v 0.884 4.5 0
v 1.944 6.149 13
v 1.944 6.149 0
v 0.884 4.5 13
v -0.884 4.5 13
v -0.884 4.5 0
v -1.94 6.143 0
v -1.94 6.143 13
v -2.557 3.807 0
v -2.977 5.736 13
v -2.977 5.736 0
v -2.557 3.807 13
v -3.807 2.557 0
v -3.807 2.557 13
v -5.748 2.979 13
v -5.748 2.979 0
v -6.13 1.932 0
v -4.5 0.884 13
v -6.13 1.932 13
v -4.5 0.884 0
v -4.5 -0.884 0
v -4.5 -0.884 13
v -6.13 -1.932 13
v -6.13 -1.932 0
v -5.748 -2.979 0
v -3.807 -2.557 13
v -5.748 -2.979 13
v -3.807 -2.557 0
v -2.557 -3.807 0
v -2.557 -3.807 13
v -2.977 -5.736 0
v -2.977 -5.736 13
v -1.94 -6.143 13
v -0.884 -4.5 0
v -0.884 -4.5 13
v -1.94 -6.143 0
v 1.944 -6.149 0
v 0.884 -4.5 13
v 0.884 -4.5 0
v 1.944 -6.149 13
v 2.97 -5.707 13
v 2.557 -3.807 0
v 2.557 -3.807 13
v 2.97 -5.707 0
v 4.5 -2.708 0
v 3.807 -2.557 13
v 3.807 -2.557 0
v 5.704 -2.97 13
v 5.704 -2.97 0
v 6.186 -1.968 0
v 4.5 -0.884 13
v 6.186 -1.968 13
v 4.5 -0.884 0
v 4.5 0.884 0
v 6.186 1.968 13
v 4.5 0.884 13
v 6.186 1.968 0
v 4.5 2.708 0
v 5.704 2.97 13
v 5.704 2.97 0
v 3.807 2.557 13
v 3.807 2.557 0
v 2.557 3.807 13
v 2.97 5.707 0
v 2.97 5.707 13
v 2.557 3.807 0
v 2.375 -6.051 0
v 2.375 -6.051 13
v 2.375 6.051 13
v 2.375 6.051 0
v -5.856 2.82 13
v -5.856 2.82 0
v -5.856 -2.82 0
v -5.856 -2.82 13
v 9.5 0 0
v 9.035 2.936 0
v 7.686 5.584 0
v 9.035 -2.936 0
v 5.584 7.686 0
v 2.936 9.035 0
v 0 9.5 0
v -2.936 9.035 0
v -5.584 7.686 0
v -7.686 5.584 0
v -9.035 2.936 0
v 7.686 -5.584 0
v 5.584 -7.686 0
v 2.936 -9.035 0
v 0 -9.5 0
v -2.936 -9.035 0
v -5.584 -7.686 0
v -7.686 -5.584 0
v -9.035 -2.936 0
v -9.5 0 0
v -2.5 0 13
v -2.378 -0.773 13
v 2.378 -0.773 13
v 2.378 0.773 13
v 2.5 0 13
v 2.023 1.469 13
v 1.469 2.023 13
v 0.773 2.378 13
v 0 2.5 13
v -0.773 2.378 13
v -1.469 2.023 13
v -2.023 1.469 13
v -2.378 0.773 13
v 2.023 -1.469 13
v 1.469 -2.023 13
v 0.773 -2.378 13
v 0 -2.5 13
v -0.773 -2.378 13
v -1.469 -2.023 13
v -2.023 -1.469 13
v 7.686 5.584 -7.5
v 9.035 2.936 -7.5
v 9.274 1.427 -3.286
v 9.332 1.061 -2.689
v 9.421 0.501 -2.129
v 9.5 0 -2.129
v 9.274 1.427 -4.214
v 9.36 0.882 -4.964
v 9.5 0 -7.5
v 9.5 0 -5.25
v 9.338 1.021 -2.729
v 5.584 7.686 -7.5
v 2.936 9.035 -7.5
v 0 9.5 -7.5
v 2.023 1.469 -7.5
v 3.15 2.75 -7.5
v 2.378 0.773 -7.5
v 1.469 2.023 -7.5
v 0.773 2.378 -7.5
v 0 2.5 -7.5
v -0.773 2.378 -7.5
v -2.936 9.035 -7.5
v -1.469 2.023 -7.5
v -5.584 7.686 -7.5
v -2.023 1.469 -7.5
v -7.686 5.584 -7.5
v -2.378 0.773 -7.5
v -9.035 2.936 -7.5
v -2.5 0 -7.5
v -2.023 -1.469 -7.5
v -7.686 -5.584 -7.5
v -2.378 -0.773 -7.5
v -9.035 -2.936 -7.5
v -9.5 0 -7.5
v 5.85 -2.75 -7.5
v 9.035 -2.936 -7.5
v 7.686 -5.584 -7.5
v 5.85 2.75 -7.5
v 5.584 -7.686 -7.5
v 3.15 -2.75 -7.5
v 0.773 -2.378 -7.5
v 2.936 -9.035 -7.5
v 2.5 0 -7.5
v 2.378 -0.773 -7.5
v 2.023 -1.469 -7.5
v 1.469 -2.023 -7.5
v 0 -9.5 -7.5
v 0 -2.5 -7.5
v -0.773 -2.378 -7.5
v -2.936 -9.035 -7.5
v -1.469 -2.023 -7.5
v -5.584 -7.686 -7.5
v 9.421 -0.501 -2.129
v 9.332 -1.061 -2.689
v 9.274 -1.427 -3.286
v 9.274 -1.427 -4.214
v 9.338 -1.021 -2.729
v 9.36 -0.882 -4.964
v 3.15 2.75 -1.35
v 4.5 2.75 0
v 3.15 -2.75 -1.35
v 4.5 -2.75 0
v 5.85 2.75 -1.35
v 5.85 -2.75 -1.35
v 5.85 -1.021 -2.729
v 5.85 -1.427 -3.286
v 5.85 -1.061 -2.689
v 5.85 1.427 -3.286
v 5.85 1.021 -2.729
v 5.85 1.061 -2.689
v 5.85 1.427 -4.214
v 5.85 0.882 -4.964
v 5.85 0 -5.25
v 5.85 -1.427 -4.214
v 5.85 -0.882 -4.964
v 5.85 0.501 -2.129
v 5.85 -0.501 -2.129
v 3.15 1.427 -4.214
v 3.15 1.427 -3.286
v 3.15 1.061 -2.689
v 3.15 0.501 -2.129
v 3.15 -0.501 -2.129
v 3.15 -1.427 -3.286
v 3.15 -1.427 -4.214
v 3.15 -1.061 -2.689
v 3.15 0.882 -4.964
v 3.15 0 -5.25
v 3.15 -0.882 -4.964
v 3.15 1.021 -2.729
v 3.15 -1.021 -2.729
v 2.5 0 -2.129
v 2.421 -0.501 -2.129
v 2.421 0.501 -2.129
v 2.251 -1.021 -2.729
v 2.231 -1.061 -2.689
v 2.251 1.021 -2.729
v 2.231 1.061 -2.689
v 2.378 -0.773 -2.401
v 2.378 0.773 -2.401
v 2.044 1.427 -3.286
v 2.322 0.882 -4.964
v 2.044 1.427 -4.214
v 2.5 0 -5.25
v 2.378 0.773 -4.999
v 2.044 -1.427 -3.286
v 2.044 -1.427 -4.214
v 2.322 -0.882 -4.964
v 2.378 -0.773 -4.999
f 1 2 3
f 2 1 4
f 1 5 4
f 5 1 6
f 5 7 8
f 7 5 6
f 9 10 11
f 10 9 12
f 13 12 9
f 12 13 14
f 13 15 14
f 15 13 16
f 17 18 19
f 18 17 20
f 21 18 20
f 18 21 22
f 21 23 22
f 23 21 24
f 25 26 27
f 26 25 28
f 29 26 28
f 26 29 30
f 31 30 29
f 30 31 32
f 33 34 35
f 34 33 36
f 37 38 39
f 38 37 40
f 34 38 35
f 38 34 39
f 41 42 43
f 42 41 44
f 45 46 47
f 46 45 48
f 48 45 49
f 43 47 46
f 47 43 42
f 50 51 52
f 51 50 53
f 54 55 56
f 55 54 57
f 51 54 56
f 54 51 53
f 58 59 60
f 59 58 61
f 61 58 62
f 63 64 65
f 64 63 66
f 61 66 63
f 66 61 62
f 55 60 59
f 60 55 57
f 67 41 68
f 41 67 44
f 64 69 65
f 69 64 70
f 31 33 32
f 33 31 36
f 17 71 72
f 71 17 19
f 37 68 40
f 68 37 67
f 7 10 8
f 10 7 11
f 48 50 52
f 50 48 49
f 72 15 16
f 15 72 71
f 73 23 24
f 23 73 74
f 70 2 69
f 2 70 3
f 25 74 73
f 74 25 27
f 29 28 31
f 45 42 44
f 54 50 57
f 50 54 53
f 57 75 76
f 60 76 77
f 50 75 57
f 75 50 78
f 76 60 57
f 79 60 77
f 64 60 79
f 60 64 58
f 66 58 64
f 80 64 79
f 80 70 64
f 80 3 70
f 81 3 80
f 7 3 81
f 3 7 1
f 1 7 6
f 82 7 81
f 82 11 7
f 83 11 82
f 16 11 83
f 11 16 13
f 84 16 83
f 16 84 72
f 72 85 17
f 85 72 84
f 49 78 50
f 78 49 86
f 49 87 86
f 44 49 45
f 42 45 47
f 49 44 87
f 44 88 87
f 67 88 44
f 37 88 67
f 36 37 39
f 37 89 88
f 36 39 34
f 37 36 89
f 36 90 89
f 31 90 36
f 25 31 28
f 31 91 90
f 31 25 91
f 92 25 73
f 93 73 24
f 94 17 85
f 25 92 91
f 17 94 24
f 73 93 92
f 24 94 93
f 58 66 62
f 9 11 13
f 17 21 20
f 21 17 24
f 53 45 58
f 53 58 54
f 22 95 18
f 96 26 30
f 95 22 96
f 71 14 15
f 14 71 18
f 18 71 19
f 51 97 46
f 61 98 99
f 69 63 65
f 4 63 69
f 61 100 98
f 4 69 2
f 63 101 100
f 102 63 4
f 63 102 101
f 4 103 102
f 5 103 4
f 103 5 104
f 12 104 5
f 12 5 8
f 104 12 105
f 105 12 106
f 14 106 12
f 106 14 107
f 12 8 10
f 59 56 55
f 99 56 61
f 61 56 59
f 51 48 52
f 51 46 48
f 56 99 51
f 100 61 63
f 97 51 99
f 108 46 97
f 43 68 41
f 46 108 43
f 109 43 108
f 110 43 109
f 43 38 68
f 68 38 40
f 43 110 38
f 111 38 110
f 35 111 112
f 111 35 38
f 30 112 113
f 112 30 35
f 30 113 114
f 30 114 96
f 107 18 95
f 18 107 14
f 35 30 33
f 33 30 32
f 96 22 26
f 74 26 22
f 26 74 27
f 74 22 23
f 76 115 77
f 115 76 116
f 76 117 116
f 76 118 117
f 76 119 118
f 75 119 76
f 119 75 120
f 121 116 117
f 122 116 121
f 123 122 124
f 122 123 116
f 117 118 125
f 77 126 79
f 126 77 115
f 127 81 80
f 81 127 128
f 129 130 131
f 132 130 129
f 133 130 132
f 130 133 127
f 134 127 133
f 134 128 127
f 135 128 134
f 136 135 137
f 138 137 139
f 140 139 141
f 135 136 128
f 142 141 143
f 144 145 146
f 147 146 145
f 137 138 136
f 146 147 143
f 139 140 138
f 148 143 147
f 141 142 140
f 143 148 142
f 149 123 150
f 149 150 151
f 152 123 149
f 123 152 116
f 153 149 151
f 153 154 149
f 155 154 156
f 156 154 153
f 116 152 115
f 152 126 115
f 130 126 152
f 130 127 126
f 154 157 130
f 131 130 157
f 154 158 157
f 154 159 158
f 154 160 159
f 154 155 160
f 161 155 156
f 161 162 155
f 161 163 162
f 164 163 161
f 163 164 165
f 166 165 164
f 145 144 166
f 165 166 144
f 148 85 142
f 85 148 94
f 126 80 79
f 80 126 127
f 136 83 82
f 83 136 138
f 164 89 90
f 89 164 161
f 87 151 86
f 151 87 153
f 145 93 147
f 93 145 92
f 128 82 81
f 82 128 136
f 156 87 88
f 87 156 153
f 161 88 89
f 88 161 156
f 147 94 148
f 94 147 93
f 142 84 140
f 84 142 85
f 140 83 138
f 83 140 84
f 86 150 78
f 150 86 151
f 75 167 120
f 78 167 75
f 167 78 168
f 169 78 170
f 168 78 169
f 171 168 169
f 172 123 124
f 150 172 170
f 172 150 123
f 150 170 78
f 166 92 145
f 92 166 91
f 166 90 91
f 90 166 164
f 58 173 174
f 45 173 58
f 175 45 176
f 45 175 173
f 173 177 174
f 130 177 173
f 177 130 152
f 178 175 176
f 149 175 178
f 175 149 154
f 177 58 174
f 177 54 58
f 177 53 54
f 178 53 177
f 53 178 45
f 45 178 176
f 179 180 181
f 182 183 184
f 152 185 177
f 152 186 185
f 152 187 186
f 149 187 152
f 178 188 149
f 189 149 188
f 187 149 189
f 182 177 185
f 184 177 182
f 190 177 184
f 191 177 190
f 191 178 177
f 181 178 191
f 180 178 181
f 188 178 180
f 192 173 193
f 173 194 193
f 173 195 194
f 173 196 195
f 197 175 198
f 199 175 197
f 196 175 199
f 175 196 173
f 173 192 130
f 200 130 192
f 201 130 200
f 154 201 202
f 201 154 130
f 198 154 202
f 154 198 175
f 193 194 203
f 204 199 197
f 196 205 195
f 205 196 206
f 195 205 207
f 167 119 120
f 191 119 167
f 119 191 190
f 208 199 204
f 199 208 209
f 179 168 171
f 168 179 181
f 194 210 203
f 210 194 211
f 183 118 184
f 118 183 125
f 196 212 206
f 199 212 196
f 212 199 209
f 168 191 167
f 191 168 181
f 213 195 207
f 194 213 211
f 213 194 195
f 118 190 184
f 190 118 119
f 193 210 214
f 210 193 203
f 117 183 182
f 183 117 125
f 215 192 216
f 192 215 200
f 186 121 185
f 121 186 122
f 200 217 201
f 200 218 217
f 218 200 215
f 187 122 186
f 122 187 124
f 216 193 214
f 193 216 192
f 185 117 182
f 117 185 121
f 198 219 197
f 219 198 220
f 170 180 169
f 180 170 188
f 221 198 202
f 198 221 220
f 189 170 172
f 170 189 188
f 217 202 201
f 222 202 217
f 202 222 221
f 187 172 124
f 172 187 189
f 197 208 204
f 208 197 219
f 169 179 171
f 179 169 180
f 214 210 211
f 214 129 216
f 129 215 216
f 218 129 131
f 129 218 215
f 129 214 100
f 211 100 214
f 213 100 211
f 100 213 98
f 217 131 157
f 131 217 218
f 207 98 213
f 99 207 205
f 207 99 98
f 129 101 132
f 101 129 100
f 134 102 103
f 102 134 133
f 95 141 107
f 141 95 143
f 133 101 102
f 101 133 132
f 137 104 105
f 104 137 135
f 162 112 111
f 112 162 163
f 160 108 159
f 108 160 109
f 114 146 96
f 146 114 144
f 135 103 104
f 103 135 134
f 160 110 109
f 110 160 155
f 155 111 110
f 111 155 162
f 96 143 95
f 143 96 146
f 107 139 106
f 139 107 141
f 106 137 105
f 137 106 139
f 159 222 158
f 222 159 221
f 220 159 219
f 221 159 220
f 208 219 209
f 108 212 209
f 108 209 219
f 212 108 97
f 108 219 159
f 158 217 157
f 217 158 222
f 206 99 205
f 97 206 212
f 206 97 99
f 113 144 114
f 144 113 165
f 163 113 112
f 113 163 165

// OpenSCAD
// file: parameters.scad
// Parameters file for RepRap Huxley (and maybe Mendel)

// Set ONE OF these true.

huxley=false;
mendel=true;



pi=3.14159265;

// The relative location in your file system where the .dxf files are
// DXFs are for quick development.  They should be replaced by parameterised CSG in dure course.

fileroot="DXF-files/";

rodsize = 6;	//threaded/smooth rod diameter in mm
xaxis = 182.5;	//width of base in mm
yaxis = 266.5;	//length of base in mm


screwsize = 3;	//bearing bore/screw diameter in mm
bearingsize = 10;	//outer diameter of bearings in mm
bearingwidth = 4;	//width of bearings in mm


rodpitch = rodsize / 6;
rodnutsize = 0.8 * rodsize;
rodnutdiameter = 1.9 * rodsize;
rodwashersize = 0.2 * rodsize;
rodwasherdiameter = 2 * rodsize;
screwpitch = screwsize / 6;
nutsize = 0.8 * screwsize;
nutdiameter = 1.9 * screwsize;
pentanutradius=1.04*screwsize;
washersize = 0.2 * screwsize;
washerdiameter = 2 * screwsize;
partthick = 2 * rodsize;
vertexrodspace = 2 * rodsize;


c = [0.3, 0.3, 0.3];
rodendoffset = rodnutsize + rodwashersize * 2 + partthick / 2;
vertexoffset = vertexrodspace + rodendoffset;


renderrodthreads = false;
renderscrewthreads = false;
fn = 36;

// The gap between the joining rods at a vertex

vertex_radius=sqrt(rodsize*rodsize + vertexoffset*vertexoffset);
vertex_ang = atan(vertexoffset/rodsize)-30;
vertex_gap = 2*vertex_radius*cos(vertex_ang);

// Nema 14 dimensions - these are absolute

nema14_square=35.3;
nema14_screws=26;
nema14_screw_r=1.5;
nema14_hub=22;
nema14_hub_depth=2;
nema14_length=36;
nema14_shaft=5;
nema14_shaft_length=66;
nema14_shaft_projection=19;

// Nema 11 dimensions - these are absolute

nema11_square=28.5;
nema11_screws=23;
nema11_screw_r=1.25;
nema11_hub=22;
nema11_hub_depth=2;
nema11_length=44.5;
nema11_shaft=5;
nema11_shaft_length=78;
nema11_shaft_projection=18;

// Limit switch parameters

limit_switch_hole_diameter=2.5;
limit_switch_centres=9.5;

// The RepRap slide bearings

bearing_mount_centres=18;
bearing_width=7;
bearing_depth=18;

// X axis parameters - many should be relative

x_bar_gap=30;
motor_center_y = 26;
bar_clamp_x=5;
bar_clamp_y=8;
bar_clamp_x_gap=23;
bearing_y=50;
bearing_x=bar_clamp_x_gap + 10;
hole_land=4;
thickness=5;
bearing_low_z = 8;
bearing_z_gap = 25;
bearing_plate_width = bearing_mount_centres+2*hole_land + 10;
bearing_plate_overlap=0.5;
bearing_plate_support=10;
// main file
include <parameters.scad>;


// inner and outer product.  Why aren't these standard?!!!?

function ip(v1 = [0,0,0], v2 = [0,0,0]) = v1.x*v2.x + v1.y*v2.y + v1.z*v2.z;

function op(v1 = [0,0,0], v2 = [0,0,0]) = [v1.y*v2.z - v1.z*v2.y, v1.z*v2.x - v1.x*v2.z, v1.x*v2.y - v1.y*v2.x];


// Adjustable slide bearings for 6mm diameter rods mounted using M3 cap screws 18 mm apart.

// The profile for these should be CSG from the parameters, but at the moment it's a dxf.

// Adrian Bowyer 18 December 2010

//*****************************************************************************************************************

// Make an extrusion from the appropriate profile

module bearingProfile(b360=true)
{
	if(b360)
		linear_extrude(file = str(fileroot, "bearing360.dxf"), layer = "0", height = bearing_width, 
			center = true, convexity = 10, twist = 0, $fn=40);
	else
		linear_extrude(file = str(fileroot, "bearing180.dxf"), layer = "0", height = bearing_width, 
			center = true, convexity = 10, twist = 0, $fn=40);
}

// The distance between the 3mm screw centres is 18 mm
// Set mounts negative to get the bearing, positive to define the teardrop angle, > 360 to get circular holes
// Set b360 true for a 360 degree bearing, false for a 180 one.

module adjustable_bearing(b360=true, mounts=-1)
{
	translate([-13,-9,0]) // Centre the shaft on the z axis
	{
		if(mounts>=0)
		{
			union()
			{
				translate([4, -10, 0])rotate(90, [0, 1, 0])
					rotate(-90, [1, 0, 0])
						if(mounts > 360)
							cylinder(r=1.5, h=50, centre = true, $fn=10);
						else
							rotate([0,0,mounts])
								teardrop(r=1.5, h=50,  center=false, teardrop_angle=0, truncateMM=0.5);
				translate([22, -10, 0])rotate(90, [0, 1, 0])
					rotate(-90, [1, 0, 0])
						if(mounts > 360)
							cylinder(r=1.5, h=50, centre = true, $fn=10);
						else
							rotate([0,0,mounts])
								teardrop(r=1.5, h=50,   center=false, teardrop_angle=0, truncateMM=0.5);
			}
		}else
		{
			difference()
			{
		  		bearingProfile(b360);
				translate([4, -10, 0])rotate(90, [0, 1, 0])
					rotate(-90, [1, 0, 0])
						teardrop(r=1.5, h=50,  center=false, teardrop_angle=0, truncateMM=0.5);
				translate([22, -10, 0])rotate(90, [0, 1, 0])
					rotate(-90, [1, 0, 0])
						teardrop(r=1.5, h=50,  center=false, teardrop_angle=0, truncateMM=0.5);
			}
		}
	}
}




/*
  This makes an angled strut in space between two points.  It is parallel to one of the
  coordinate planes, which means that one coordinate of the two endpoints must be the same.
*/

module strut_block(da, db, wide, deep, round=1)
{
	union()
	{
		translate([-wide/2,-deep/2,0])
			cube([wide, deep, sqrt(da*da + db*db)]);
		if(round == 1)
		{
			rotate([90,0,0])
					cylinder(r=wide/2, h=deep,center=true,$fn=20);
			translate([0,0,sqrt(da*da + db*db)])
				rotate([90,0,0])
					cylinder(r=wide/2, h=deep,center=true,$fn=20);
		} else if(round == 2)
		{
			rotate([0,90,0])
					cylinder(r=deep/2, h=wide,center=true,$fn=20);
			translate([0,0,sqrt(da*da + db*db)])
				rotate([0,90,0])
					cylinder(r=deep/2, h=wide,center=true,$fn=20);
		}
	}
}

module strut(p1=[0,0,0], p2=[0,0,1], wide = 10, deep = 5, round=1)
{
	if(abs(p1.x - p2.x) < 0.00001)
	{
		translate(p1)
			rotate([atan2(p2.z - p1.z, p2.y - p1.y), 0, 0])
				rotate([-90,0,0])
					rotate([0,0,90])
						strut_block(p2.y - p1.y, p2.z - p1.z, wide, deep, round);
	} else if(abs(p1.y - p2.y) < 0.00001)
	{
		translate(p1)
			rotate([0,atan2( p2.x - p1.x, p2.z - p1.z), 0])
					strut_block(p2.x - p1.x, p2.z - p1.z, wide, deep);
	} else
	{
		translate(p1)
			rotate([0,0,atan2(p2.y - p1.y, p2.x - p1.x)])
				rotate([0,90,0])
					strut_block(p2.x - p1.x, p2.y - p1.y, wide, deep, round);
	}
}


/*
  This gives either a NEMA 14 stepper motor or its mounting holes.

  If body is true, you get the motor.  If it is false you get the screw holes and central
  hole needed to mount the motor.  If counterbore is positive and you are generating the mounting holes
  then the screw holes will get fat to accomodate a cap-screw head counterbore mm away from the face 
  of the motor.  For no counterbores, set counterbore negative.

*/

module nema14(body = true, slots = -1, counterbore = -1)
{
	color([1,0.4,0.4,1])
	union()
	{
		if(body)
		{
			translate([0, 0, nema14_shaft_length/2 - nema14_shaft_projection - nema14_hub_depth])
				cylinder(r = nema14_shaft/2, h = nema14_shaft_length, center = true, $fn=20);
			translate([0, 0, -nema14_hub_depth])
				cylinder(r = nema14_hub/2, h = nema14_hub_depth*2, center = true, $fn=20);
	
			translate([0, 0, nema14_length/2])
				cube([nema14_square,nema14_square,nema14_length], center = true);
		} else
			translate([0, 0, -20])
				cylinder(r = nema14_hub/2 + 1, h = 50, center = true, $fn=20);

		if(!body)
		{
			union()
			{
				for ( x = [-0.5, 0.5] ) 
				for ( y = [-0.5, 0.5] )
				{
					translate([x*nema14_screws, y*nema14_screws, -20])
						if(slots <= 0)
							cylinder(r = nema14_screw_r, h = 50, center = true, $fn=10);
						else
							cube([slots, nema14_screw_r*2, 50], center=true);
					if(counterbore >= 0)
						translate([x*nema14_screws, y*nema14_screws, -25-counterbore])
							if(slots <= 0)
								cylinder(r = 2*nema14_screw_r, h = 50, center = true, $fn=10);
							else
								cube([slots+2*nema14_screw_r, nema14_screw_r*4,  50], center=true);
				}
			}
		}
	}
}

module nema11(body = true, slots = -1, counterbore = -1)
{
	color([1,0.4,0.4,1])
	union()
	{
		if(body)
		{
			translate([0, 0, nema11_shaft_length/2 - nema11_shaft_projection - nema11_hub_depth])
				cylinder(r = nema11_shaft/2, h = nema11_shaft_length, center = true, $fn=20);
			translate([0, 0, -nema11_hub_depth])
				cylinder(r = nema11_hub/2, h = nema11_hub_depth*2, center = true, $fn=20);
	
			translate([0, 0, nema11_length/2])
				cube([nema11_square,nema11_square,nema11_length], center = true);
		} else
			translate([0, 0, -20])
				cylinder(r = nema11_hub/2 + 1, h = 50, center = true, $fn=20);

		if(!body)
		{
			union()
			{
				for ( x = [-0.5, 0.5] ) 
				for ( y = [-0.5, 0.5] )
				{
					translate([x*nema11_screws, y*nema11_screws, -20])
						if(slots <= 0)
							cylinder(r = nema11_screw_r, h = 50, center = true, $fn=10);
						else
							cube([slots, nema11_screw_r*2, 50], center=true);
					if(counterbore >= 0)
						translate([x*nema11_screws, y*nema11_screws, -25-counterbore])
							if(slots <= 0)
								cylinder(r = 2*nema11_screw_r, h = 50, center = true, $fn=10);
							else
								cube([slots+2*nema11_screw_r, nema11_screw_r*4,  50], center=true);
				}
			}
		}
	}
}


// Pentagon nut that matches a hexagon...

module pentanut(height=2*nutsize, center=false)
{
		linear_extrude(height = height, center = center, convexity = 10, twist = 0)
			polygon(points = [ [0, -pentanutradius],
							[-pentanutradius*sqrt(3), 0], 
							[0, pentanutradius], 
							[pentanutradius*sin(60), pentanutradius*cos(60)], 
							[pentanutradius*sin(120), pentanutradius*cos(120)], 
							], paths=[[0,1,2,3,4]]);
}



// Make a RepRap teardrop with its axis along Z
// If truncated is true, chop the apex; if not, come to a point

// I stole this function from Erik...

// If teardrop_angle is negative, this just gives an ordinary cylinder.  If it is zero or positive, the 
// teardrop is rotated through that angle.  Other arguments are as for the standard cylinder function.

module teardrop_internal(r=1.5, h=20, teardrop_angle=-1, truncateMM=0.5)
{
	if(teardrop_angle < 0)
		cylinder(r=r, h=h, center=false, $fn=max(2*r, 10));
	 else
		rotate([0, 0, teardrop_angle])
			union()
			{
				if(truncateMM > 0)
				{
					intersection()
					{
						translate([truncateMM,0,h/2]) 
							scale([1,1,h])
								cube([r*2.8275,r*2,1],center=true);
						scale([1,1,h]) 
								rotate([0,0,3*45])
									cube([r,r,1]);
					}
				} else
				{
					scale([1,1,h])
						rotate([0,0,3*45])
							cube([r,r,1]);
				}
				cylinder(r=r, h = h, center=false, $fn=max(2*r, 10));
		}
}

module teardrop(r=1.5, h=20, center=false, teardrop_angle=-1, truncateMM=0.5)
{
	if(center)
		translate([0, 0, -h/2])
			teardrop_internal(r=r, h=h, teardrop_angle=teardrop_angle, truncateMM=truncateMM);
	else
		teardrop_internal(r=r, h=h, teardrop_angle=teardrop_angle, truncateMM=truncateMM);
}


// Make a ball-bearing holder cutout

module bearing_holder(radius = 6.5)
{
	union()
	{
		cylinder (h = radius*20, r = radius, center = true, $fn = 20);
		for(i=[0:2])
		{
			rotate([0,0,120*i])
				translate([radius+screwsize/2, 0, 0])
					union()
					{
						cylinder (h = radius*20, r = screwsize/2, center = true, $fn = 20);
						translate([-screwsize, 0, 0])
							cube([2*screwsize, screwsize, radius*20], center = true);
					}
		}
	}
}

// Make a cuboid with a 45 degree top for vertical slots etc

module cen_hat(size)
{
	translate([0, 0, size.x/sqrt(2)])
		union()
		{
			rotate([0, 45, 0])
				cube([size.x, size.y, 5*max(size.x, max(size.y, size.z))], center=true);
			rotate([0, -45, 0])
				cube([size.x, size.y, 5*max(size.x, max(size.y, size.z))], center=true);
		}
}

module hat_cube(size = [1,1,1], center = false)
{
	difference()
	{
		cube(size, center);
		if(center)
			translate([0, 0, size.z/2])
				cen_hat(size);
		else
			translate([size.x/2, size.y/2, size.z])
				cen_hat(size);
	}
}



module rod(length, threaded=false) if (threaded && renderrodthreads) {
	linear_extrude(height = length, center = true, convexity = 10, twist = -360 * length / rodpitch, $fn = fn)
		translate([rodsize * 0.1 / 2, 0, 0])
			circle(r = rodsize * 0.9 / 2, $fn = fn);
} else cylinder(h = length, r = rodsize / 2, center = true, $fn = fn);


module rodnut(position, washer) render() translate([0, 0, position]) {
	intersection() {
		scale([1, 1, 0.5]) sphere(r = 1.05 * rodsize, center = true);
		difference() {
			cylinder (h = rodnutsize, r = rodnutdiameter / 2, center = true, $fn = 6);
			rod(rodnutsize + 0.1);
		}
	}
	if (washer == 1 || washer == 4) rodwasher(((position > 0) ? -1 : 1) * (rodnutsize + rodwashersize) / 2);
	if (washer == 2 || washer == 4) rodwasher(((position > 0) ? 1 : -1) * (rodnutsize + rodwashersize) / 2);
}


module rodwasher(position) render() translate ([0, 0, position]) difference() {
	cylinder(r = rodwasherdiameter / 2, h = rodwashersize, center = true, $fn = fn);
	rod(rodwashersize + 0.1);
}


module screw(length, nutpos, washer, bearingpos = -1) union(){
	translate([0, 0, -length / 2]) if (renderscrewthreads) {
		linear_extrude(height = length, center = true, convexity = 10, twist = -360 * length / screwpitch, $fn = fn)
			translate([screwsize * 0.1 / 2, 0, 0])
				circle(r = screwsize * 0.9 / 2, $fn = fn);
	} else cylinder(h = length, r = screwsize / 2, center = true, $fn = fn);
	render() difference() {
		translate([0, 0, screwsize / 2]) cylinder(h = screwsize, r = screwsize, center = true, $fn = fn);
		translate([0, 0, screwsize]) cylinder(h = screwsize, r = screwsize / 2, center = true, $fn = 6);
	}
	if (washer > 0 && nutpos > 0) {
		washer(nutpos);
		nut(nutpos + washersize);
	} else if (nutpos > 0) nut(nutpos);
	if (bearingpos >= 0) bearing(bearingpos);
}


module bearing(position) render() translate([0, 0, -position - bearingwidth / 2]) union() {
	difference() {
		cylinder(h = bearingwidth, r = bearingsize / 2, center = true, $fn = fn);
		cylinder(h = bearingwidth * 2, r = bearingsize / 2 - 1, center = true, $fn = fn);
	}
	difference() {
		cylinder(h = bearingwidth - 0.5, r = bearingsize / 2 - 0.5, center = true, $fn = fn);
		cylinder(h = bearingwidth * 2, r = screwsize / 2 + 0.5, center = true, $fn = fn);
	}
	difference() {
		cylinder(h = bearingwidth, r = screwsize / 2 + 1, center = true, $fn = fn);
		cylinder(h = bearingwidth + 0.1, r = screwsize / 2, center = true, $fn = fn);
	}
}


module nut(position, washer) render() translate([0, 0, -position - nutsize / 2]) {
	intersection() {
		scale([1, 1, 0.5]) sphere(r = 1.05 * screwsize, center = true);
		difference() {
			cylinder (h = nutsize, r = nutdiameter / 2, center = true, $fn = 6);
			cylinder(r = screwsize / 2, h = nutsize + 0.1, center = true, $fn = fn);
		}
	}
	if (washer > 0) washer(0);
}


module washer(position) render() translate ([0, 0, -position - washersize / 2]) difference() {
	cylinder(r = washerdiameter / 2, h = washersize, center = true, $fn = fn);
	cylinder(r = screwsize / 2, h = washersize + 0.1, center = true, $fn = fn);
}


module tooth_gap(height = 10, number_of_teeth = 11, inner_radius = 10, dr = 3,  angle=7)
{
	linear_extrude(height = 2*height, center = true, convexity = 10, twist = 0)
		polygon( points = [
			[pi*inner_radius/(2*number_of_teeth), 0],
			[-pi*inner_radius/(2*number_of_teeth), 0],
			[-2*dr *sin(angle) - pi*inner_radius/(2*number_of_teeth), 2*dr],
			[2*dr *sin(angle) + pi*inner_radius/(2*number_of_teeth), 2*dr],
		], convexity = 3);
}



module gear(height = 10, number_of_teeth = 11, inner_radius = 10, outer_radius = 12, angle=15)
{
	difference()
	{
		cylinder(h = height, r = outer_radius, centre = true);
		for(i = [0:number_of_teeth])
		{
		rotate([0, 0, i*360/number_of_teeth])
			translate([0, inner_radius, 0.5*height])
				tooth_gap(height = height, number_of_teeth = number_of_teeth, inner_radius = inner_radius, 
					dr =  outer_radius - inner_radius,  angle=angle);
		}
	}
}

module grub_gear(hub_height=7.5, hub_radius = 9.5, shaft_radius = 2.5, height =13, number_of_teeth = 8, inner_radius = 4.5, outer_radius = 6.5, angle=40)
{
	difference()
	{
		union()
		{
			translate([0,0,0])
				gear(height =height, number_of_teeth = number_of_teeth, inner_radius = inner_radius, 
					outer_radius = outer_radius, angle=angle);
			translate([0,0,-hub_height/2])
				cylinder(h = hub_height, r = hub_radius,center=true,$fn=20);
		}
		
		cylinder(h = 30, r = shaft_radius, center=true,$fn=20);
		
		translate([shaft_radius + 2, 0, -5])
			hat_cube([2.7,5.5,10], center=true);
		translate([0,0,-3.75])
			rotate([0,90,0])
				if(hub_radius >= outer_radius)
					teardrop(h = 2*hub_radius, r = screwsize/2, center=false, teardrop_angle=0, truncateMM=0.5);
				else
					rotate([0,0,180])
						teardrop(h = 2*hub_radius, r = screwsize/2, center=false, teardrop_angle=0, truncateMM=0.5);
	}
}


grub_gear();

//gear();



//rod(20);
//translate([rodsize * 2.5, 0, 0]) rod(20, true);
//translate([rodsize * 5, 0, 0]) screw(10, true);
//translate([rodsize * 7.5, 0, 0]) bearing();
//translate([rodsize * 10, 0, 0]) rodnut();
//translate([rodsize * 12.5, 0, 0]) rodwasher();
//translate([rodsize * 15, 0, 0]) nut();
//translate([rodsize * 17.5, 0, 0]) washer();

//hat_cube(size=[2,40,2], center=false);

//bearing_holder();

//teardrop(r=15, h=20, center=true, teardrop_angle=-1, truncateMM=0.5);


//pentanut(height=2*nutsize,center=true);


//nema14(body = false, counterbore = 8);

//nema11(body = false, counterbore = 8);
//strut(p1=[20,10,20], p2=[20, 60, 40], wide=10, deep=5, round=2);


//adjustable_bearing(true, false);
